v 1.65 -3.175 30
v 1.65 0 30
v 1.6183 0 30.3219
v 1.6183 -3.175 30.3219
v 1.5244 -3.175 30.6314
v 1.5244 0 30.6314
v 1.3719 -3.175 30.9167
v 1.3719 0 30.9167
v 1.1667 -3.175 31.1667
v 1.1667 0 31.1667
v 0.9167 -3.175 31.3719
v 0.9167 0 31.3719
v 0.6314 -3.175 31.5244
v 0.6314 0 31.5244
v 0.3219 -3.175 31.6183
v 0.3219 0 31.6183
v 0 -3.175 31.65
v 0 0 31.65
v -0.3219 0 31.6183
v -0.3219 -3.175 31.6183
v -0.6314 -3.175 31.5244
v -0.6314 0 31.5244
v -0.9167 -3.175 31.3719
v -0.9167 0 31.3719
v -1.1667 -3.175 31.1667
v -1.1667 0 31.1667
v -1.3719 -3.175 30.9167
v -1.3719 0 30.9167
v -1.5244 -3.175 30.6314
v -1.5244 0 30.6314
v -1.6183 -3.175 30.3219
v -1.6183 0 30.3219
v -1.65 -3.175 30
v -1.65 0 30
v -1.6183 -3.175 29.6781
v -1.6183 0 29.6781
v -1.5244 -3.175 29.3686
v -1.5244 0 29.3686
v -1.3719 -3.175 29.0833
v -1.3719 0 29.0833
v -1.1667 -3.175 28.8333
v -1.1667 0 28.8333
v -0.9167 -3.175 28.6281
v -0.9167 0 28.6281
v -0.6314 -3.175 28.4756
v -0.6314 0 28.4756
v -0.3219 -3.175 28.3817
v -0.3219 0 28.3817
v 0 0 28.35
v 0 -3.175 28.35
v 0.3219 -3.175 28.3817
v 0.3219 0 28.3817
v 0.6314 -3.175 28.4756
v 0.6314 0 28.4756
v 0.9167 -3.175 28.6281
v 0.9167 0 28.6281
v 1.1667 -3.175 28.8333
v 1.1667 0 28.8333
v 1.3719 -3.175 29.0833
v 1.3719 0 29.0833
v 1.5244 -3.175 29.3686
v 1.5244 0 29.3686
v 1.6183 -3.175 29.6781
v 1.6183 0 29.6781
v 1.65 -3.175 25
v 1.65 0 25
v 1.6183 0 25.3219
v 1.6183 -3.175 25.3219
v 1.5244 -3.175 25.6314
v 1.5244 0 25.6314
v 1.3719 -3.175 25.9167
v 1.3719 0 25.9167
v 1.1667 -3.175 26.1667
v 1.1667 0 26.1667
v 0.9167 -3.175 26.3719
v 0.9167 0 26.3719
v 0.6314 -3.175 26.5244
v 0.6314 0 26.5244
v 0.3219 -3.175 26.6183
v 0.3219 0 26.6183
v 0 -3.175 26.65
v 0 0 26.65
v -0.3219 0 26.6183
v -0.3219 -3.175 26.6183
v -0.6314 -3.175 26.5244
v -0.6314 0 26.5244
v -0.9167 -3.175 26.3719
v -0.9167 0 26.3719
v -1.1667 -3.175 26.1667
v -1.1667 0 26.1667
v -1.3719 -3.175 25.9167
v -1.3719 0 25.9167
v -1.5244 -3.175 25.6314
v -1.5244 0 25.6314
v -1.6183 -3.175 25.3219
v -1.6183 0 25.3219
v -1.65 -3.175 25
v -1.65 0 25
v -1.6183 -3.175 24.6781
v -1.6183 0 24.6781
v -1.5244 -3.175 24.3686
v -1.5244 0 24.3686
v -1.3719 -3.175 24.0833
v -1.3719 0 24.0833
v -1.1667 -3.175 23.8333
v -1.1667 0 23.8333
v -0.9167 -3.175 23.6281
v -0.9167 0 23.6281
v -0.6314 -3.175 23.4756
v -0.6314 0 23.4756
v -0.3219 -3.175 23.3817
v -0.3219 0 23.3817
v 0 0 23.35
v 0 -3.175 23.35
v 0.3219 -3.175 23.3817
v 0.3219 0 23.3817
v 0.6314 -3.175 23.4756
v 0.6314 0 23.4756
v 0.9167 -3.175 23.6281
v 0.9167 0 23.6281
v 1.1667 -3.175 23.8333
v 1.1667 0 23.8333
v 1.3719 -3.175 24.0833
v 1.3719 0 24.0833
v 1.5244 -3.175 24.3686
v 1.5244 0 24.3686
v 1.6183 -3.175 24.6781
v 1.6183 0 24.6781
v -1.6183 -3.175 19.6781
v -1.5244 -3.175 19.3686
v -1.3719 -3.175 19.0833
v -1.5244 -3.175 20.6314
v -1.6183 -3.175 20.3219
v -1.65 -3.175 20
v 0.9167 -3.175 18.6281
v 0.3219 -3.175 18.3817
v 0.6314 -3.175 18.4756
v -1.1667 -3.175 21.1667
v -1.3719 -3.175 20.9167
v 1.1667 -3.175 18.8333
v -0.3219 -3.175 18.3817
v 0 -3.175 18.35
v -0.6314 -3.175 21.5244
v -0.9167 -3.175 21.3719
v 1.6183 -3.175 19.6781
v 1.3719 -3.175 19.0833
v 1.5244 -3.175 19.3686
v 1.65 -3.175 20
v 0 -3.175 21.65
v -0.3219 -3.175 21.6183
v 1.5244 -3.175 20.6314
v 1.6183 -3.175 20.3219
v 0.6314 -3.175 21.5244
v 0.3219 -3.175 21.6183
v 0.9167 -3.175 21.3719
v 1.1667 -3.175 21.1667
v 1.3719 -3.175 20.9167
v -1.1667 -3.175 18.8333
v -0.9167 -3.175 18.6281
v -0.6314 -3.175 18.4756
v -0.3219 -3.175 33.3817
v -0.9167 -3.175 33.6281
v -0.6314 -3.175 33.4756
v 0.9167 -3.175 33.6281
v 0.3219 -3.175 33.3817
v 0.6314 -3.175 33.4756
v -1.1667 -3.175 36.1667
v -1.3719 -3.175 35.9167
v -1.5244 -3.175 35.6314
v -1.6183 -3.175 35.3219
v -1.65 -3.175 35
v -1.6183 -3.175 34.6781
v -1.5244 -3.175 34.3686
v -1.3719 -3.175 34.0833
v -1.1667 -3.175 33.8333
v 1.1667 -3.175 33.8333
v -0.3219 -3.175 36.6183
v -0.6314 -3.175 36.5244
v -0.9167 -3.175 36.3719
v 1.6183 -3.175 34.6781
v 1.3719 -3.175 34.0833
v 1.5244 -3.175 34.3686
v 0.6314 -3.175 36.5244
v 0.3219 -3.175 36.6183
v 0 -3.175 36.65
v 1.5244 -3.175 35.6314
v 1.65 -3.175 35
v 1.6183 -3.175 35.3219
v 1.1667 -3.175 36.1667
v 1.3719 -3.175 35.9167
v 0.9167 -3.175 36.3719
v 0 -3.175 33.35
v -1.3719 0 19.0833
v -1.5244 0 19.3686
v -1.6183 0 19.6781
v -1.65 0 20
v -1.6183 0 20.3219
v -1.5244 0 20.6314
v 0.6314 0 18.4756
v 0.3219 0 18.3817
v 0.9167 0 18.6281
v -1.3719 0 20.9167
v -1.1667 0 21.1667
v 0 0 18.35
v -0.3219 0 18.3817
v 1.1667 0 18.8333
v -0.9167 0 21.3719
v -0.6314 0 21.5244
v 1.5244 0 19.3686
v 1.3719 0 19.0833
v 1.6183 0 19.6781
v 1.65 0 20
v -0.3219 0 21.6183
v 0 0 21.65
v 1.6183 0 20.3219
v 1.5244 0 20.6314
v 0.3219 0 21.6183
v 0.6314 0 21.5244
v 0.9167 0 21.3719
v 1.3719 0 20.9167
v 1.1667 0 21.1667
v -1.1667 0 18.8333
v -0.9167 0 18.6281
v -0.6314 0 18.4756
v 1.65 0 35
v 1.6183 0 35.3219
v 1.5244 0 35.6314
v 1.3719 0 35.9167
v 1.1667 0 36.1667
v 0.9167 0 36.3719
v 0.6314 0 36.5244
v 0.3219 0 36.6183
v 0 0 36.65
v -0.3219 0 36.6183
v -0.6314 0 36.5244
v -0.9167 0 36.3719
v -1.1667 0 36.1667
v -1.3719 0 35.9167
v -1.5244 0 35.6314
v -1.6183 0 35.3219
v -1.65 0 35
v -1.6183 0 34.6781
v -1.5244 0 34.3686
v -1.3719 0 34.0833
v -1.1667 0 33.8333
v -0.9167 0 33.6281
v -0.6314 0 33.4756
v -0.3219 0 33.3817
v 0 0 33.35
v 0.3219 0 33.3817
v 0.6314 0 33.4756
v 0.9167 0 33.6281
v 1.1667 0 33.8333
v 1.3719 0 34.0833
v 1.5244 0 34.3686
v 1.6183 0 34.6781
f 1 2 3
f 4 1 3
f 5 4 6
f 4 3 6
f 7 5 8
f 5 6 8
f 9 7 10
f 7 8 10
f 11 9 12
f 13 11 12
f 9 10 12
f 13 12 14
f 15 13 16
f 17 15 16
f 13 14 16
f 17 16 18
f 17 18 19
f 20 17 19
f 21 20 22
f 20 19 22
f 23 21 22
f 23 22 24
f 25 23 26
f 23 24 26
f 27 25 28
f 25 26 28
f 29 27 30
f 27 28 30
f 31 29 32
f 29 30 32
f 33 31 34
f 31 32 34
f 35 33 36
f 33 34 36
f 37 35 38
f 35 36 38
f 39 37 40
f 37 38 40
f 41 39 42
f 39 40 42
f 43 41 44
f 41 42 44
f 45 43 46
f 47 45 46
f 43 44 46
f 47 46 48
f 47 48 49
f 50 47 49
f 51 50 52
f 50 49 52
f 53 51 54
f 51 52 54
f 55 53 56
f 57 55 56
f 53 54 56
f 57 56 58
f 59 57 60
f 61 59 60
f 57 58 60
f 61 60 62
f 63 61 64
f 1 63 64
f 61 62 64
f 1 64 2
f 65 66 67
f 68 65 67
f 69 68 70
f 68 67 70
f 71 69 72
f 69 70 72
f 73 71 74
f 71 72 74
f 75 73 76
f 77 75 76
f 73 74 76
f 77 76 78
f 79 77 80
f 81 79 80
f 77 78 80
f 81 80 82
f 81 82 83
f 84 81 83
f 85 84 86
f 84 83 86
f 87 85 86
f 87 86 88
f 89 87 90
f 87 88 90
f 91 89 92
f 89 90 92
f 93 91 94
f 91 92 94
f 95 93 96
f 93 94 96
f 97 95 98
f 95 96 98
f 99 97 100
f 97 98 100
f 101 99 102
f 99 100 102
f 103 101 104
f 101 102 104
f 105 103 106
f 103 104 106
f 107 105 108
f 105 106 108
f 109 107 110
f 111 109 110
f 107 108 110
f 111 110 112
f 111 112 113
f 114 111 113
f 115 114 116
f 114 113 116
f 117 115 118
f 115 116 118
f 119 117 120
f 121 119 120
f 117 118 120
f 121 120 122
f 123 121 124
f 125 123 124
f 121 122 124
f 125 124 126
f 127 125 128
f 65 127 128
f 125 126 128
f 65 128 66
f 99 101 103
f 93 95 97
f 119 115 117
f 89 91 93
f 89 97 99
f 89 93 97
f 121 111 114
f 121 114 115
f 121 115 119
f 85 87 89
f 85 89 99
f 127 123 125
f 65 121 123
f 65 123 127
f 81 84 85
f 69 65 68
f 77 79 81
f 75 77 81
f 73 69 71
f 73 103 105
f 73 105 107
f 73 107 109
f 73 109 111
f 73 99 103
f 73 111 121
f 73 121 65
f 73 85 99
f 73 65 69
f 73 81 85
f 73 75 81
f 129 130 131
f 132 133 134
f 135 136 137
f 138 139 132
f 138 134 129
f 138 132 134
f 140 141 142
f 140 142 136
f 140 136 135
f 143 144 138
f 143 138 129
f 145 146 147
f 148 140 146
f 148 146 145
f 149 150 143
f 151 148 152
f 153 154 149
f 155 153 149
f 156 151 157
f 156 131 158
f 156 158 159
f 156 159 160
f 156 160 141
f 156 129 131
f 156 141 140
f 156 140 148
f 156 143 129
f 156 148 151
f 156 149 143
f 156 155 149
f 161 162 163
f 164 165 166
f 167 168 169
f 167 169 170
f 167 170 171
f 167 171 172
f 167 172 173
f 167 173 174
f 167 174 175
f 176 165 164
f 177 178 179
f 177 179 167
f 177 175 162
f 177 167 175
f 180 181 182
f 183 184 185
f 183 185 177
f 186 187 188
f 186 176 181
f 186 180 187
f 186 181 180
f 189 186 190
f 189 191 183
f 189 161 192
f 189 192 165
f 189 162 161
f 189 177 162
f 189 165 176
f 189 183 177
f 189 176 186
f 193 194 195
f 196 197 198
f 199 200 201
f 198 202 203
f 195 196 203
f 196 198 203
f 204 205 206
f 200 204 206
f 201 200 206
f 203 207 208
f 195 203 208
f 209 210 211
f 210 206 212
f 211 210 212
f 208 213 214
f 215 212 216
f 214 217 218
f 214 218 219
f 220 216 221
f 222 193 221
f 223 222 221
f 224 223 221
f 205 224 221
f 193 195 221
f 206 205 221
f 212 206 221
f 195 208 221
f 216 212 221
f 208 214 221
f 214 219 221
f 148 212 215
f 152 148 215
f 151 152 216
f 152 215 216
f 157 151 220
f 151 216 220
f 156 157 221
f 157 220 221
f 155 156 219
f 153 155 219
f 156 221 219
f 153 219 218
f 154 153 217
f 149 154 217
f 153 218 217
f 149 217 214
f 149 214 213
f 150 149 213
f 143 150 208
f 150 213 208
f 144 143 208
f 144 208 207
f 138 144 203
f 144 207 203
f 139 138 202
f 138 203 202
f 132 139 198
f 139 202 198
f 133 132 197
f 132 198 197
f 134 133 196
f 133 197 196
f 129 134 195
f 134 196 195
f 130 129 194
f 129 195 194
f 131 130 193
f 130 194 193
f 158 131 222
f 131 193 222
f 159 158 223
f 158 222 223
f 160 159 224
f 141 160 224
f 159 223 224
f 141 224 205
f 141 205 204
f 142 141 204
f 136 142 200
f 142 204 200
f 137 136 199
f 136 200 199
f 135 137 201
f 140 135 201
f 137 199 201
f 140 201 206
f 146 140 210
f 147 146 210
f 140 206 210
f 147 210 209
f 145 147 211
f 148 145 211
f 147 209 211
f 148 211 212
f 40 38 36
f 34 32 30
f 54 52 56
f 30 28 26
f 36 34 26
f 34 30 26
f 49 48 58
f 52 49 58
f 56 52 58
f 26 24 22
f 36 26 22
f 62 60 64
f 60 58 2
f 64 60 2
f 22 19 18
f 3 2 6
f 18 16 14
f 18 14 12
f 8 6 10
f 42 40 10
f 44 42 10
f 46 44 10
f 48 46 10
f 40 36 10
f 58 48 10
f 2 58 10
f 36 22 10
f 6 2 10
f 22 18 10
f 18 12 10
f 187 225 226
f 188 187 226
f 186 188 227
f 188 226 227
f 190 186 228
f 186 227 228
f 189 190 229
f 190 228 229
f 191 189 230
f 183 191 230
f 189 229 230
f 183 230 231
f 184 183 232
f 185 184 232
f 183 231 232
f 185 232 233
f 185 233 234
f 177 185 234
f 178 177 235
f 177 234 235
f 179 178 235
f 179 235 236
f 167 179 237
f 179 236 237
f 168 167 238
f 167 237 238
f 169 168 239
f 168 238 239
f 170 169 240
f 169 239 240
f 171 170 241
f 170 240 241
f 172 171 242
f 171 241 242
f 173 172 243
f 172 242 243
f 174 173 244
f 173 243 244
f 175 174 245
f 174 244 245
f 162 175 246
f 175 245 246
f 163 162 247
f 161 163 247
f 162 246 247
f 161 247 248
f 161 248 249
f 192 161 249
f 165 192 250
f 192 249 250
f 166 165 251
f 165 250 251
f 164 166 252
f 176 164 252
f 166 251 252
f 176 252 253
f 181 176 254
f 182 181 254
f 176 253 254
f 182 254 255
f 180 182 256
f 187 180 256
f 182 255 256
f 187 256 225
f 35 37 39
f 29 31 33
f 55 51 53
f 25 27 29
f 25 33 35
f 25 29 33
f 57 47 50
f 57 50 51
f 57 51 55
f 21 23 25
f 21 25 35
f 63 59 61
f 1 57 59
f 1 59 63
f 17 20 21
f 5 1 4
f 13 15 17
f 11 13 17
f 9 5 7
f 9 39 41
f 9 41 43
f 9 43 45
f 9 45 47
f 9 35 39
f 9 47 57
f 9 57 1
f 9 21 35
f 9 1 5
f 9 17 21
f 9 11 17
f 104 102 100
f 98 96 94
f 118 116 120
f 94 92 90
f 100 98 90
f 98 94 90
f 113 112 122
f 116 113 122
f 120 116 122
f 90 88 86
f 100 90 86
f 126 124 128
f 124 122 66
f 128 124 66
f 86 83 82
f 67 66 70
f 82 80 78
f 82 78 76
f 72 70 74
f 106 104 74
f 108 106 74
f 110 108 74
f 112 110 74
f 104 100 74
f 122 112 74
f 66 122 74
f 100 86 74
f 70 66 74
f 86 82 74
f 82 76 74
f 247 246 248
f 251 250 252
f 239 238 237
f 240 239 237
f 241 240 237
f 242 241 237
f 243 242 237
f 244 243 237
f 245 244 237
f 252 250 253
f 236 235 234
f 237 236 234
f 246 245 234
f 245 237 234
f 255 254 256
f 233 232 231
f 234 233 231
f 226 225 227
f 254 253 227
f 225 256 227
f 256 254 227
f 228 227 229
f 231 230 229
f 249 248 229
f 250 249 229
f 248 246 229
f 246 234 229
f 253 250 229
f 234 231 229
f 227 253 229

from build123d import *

# Parameters (mm, degrees)
F0_R     = 1.65
F1_DEPTH = 3.175


# Not quite as in the source:
# - a length typed as a fraction of an inch, garbled in the dataset ("3 / 203.2 mm" for 3/8 in), is restored


with BuildPart() as f1:
    # F0 (on Front) → F1 (new body)
    with BuildSketch(Plane.XZ):
        with Locations((0, 35)):
            Circle(F0_R)
    extrude(amount=F1_DEPTH)


with BuildPart() as f1b:
    # F0 (on Front) → F1, piece 2 (new body)
    with BuildSketch(Plane.XZ):
        with Locations((0, 30)):
            Circle(F0_R)
    extrude(amount=F1_DEPTH)


with BuildPart() as f1c:
    # F0 (on Front) → F1, piece 3 (new body)
    with BuildSketch(Plane.XZ):
        with Locations((0, 25)):
            Circle(F0_R)
    extrude(amount=F1_DEPTH)


with BuildPart() as f1d:
    # F0 (on Front) → F1, piece 4 (new body)
    with BuildSketch(Plane.XZ):
        with Locations((0, 20)):
            Circle(F0_R)
    extrude(amount=F1_DEPTH)


solid = Compound([f1.part, f1b.part, f1c.part, f1d.part])
